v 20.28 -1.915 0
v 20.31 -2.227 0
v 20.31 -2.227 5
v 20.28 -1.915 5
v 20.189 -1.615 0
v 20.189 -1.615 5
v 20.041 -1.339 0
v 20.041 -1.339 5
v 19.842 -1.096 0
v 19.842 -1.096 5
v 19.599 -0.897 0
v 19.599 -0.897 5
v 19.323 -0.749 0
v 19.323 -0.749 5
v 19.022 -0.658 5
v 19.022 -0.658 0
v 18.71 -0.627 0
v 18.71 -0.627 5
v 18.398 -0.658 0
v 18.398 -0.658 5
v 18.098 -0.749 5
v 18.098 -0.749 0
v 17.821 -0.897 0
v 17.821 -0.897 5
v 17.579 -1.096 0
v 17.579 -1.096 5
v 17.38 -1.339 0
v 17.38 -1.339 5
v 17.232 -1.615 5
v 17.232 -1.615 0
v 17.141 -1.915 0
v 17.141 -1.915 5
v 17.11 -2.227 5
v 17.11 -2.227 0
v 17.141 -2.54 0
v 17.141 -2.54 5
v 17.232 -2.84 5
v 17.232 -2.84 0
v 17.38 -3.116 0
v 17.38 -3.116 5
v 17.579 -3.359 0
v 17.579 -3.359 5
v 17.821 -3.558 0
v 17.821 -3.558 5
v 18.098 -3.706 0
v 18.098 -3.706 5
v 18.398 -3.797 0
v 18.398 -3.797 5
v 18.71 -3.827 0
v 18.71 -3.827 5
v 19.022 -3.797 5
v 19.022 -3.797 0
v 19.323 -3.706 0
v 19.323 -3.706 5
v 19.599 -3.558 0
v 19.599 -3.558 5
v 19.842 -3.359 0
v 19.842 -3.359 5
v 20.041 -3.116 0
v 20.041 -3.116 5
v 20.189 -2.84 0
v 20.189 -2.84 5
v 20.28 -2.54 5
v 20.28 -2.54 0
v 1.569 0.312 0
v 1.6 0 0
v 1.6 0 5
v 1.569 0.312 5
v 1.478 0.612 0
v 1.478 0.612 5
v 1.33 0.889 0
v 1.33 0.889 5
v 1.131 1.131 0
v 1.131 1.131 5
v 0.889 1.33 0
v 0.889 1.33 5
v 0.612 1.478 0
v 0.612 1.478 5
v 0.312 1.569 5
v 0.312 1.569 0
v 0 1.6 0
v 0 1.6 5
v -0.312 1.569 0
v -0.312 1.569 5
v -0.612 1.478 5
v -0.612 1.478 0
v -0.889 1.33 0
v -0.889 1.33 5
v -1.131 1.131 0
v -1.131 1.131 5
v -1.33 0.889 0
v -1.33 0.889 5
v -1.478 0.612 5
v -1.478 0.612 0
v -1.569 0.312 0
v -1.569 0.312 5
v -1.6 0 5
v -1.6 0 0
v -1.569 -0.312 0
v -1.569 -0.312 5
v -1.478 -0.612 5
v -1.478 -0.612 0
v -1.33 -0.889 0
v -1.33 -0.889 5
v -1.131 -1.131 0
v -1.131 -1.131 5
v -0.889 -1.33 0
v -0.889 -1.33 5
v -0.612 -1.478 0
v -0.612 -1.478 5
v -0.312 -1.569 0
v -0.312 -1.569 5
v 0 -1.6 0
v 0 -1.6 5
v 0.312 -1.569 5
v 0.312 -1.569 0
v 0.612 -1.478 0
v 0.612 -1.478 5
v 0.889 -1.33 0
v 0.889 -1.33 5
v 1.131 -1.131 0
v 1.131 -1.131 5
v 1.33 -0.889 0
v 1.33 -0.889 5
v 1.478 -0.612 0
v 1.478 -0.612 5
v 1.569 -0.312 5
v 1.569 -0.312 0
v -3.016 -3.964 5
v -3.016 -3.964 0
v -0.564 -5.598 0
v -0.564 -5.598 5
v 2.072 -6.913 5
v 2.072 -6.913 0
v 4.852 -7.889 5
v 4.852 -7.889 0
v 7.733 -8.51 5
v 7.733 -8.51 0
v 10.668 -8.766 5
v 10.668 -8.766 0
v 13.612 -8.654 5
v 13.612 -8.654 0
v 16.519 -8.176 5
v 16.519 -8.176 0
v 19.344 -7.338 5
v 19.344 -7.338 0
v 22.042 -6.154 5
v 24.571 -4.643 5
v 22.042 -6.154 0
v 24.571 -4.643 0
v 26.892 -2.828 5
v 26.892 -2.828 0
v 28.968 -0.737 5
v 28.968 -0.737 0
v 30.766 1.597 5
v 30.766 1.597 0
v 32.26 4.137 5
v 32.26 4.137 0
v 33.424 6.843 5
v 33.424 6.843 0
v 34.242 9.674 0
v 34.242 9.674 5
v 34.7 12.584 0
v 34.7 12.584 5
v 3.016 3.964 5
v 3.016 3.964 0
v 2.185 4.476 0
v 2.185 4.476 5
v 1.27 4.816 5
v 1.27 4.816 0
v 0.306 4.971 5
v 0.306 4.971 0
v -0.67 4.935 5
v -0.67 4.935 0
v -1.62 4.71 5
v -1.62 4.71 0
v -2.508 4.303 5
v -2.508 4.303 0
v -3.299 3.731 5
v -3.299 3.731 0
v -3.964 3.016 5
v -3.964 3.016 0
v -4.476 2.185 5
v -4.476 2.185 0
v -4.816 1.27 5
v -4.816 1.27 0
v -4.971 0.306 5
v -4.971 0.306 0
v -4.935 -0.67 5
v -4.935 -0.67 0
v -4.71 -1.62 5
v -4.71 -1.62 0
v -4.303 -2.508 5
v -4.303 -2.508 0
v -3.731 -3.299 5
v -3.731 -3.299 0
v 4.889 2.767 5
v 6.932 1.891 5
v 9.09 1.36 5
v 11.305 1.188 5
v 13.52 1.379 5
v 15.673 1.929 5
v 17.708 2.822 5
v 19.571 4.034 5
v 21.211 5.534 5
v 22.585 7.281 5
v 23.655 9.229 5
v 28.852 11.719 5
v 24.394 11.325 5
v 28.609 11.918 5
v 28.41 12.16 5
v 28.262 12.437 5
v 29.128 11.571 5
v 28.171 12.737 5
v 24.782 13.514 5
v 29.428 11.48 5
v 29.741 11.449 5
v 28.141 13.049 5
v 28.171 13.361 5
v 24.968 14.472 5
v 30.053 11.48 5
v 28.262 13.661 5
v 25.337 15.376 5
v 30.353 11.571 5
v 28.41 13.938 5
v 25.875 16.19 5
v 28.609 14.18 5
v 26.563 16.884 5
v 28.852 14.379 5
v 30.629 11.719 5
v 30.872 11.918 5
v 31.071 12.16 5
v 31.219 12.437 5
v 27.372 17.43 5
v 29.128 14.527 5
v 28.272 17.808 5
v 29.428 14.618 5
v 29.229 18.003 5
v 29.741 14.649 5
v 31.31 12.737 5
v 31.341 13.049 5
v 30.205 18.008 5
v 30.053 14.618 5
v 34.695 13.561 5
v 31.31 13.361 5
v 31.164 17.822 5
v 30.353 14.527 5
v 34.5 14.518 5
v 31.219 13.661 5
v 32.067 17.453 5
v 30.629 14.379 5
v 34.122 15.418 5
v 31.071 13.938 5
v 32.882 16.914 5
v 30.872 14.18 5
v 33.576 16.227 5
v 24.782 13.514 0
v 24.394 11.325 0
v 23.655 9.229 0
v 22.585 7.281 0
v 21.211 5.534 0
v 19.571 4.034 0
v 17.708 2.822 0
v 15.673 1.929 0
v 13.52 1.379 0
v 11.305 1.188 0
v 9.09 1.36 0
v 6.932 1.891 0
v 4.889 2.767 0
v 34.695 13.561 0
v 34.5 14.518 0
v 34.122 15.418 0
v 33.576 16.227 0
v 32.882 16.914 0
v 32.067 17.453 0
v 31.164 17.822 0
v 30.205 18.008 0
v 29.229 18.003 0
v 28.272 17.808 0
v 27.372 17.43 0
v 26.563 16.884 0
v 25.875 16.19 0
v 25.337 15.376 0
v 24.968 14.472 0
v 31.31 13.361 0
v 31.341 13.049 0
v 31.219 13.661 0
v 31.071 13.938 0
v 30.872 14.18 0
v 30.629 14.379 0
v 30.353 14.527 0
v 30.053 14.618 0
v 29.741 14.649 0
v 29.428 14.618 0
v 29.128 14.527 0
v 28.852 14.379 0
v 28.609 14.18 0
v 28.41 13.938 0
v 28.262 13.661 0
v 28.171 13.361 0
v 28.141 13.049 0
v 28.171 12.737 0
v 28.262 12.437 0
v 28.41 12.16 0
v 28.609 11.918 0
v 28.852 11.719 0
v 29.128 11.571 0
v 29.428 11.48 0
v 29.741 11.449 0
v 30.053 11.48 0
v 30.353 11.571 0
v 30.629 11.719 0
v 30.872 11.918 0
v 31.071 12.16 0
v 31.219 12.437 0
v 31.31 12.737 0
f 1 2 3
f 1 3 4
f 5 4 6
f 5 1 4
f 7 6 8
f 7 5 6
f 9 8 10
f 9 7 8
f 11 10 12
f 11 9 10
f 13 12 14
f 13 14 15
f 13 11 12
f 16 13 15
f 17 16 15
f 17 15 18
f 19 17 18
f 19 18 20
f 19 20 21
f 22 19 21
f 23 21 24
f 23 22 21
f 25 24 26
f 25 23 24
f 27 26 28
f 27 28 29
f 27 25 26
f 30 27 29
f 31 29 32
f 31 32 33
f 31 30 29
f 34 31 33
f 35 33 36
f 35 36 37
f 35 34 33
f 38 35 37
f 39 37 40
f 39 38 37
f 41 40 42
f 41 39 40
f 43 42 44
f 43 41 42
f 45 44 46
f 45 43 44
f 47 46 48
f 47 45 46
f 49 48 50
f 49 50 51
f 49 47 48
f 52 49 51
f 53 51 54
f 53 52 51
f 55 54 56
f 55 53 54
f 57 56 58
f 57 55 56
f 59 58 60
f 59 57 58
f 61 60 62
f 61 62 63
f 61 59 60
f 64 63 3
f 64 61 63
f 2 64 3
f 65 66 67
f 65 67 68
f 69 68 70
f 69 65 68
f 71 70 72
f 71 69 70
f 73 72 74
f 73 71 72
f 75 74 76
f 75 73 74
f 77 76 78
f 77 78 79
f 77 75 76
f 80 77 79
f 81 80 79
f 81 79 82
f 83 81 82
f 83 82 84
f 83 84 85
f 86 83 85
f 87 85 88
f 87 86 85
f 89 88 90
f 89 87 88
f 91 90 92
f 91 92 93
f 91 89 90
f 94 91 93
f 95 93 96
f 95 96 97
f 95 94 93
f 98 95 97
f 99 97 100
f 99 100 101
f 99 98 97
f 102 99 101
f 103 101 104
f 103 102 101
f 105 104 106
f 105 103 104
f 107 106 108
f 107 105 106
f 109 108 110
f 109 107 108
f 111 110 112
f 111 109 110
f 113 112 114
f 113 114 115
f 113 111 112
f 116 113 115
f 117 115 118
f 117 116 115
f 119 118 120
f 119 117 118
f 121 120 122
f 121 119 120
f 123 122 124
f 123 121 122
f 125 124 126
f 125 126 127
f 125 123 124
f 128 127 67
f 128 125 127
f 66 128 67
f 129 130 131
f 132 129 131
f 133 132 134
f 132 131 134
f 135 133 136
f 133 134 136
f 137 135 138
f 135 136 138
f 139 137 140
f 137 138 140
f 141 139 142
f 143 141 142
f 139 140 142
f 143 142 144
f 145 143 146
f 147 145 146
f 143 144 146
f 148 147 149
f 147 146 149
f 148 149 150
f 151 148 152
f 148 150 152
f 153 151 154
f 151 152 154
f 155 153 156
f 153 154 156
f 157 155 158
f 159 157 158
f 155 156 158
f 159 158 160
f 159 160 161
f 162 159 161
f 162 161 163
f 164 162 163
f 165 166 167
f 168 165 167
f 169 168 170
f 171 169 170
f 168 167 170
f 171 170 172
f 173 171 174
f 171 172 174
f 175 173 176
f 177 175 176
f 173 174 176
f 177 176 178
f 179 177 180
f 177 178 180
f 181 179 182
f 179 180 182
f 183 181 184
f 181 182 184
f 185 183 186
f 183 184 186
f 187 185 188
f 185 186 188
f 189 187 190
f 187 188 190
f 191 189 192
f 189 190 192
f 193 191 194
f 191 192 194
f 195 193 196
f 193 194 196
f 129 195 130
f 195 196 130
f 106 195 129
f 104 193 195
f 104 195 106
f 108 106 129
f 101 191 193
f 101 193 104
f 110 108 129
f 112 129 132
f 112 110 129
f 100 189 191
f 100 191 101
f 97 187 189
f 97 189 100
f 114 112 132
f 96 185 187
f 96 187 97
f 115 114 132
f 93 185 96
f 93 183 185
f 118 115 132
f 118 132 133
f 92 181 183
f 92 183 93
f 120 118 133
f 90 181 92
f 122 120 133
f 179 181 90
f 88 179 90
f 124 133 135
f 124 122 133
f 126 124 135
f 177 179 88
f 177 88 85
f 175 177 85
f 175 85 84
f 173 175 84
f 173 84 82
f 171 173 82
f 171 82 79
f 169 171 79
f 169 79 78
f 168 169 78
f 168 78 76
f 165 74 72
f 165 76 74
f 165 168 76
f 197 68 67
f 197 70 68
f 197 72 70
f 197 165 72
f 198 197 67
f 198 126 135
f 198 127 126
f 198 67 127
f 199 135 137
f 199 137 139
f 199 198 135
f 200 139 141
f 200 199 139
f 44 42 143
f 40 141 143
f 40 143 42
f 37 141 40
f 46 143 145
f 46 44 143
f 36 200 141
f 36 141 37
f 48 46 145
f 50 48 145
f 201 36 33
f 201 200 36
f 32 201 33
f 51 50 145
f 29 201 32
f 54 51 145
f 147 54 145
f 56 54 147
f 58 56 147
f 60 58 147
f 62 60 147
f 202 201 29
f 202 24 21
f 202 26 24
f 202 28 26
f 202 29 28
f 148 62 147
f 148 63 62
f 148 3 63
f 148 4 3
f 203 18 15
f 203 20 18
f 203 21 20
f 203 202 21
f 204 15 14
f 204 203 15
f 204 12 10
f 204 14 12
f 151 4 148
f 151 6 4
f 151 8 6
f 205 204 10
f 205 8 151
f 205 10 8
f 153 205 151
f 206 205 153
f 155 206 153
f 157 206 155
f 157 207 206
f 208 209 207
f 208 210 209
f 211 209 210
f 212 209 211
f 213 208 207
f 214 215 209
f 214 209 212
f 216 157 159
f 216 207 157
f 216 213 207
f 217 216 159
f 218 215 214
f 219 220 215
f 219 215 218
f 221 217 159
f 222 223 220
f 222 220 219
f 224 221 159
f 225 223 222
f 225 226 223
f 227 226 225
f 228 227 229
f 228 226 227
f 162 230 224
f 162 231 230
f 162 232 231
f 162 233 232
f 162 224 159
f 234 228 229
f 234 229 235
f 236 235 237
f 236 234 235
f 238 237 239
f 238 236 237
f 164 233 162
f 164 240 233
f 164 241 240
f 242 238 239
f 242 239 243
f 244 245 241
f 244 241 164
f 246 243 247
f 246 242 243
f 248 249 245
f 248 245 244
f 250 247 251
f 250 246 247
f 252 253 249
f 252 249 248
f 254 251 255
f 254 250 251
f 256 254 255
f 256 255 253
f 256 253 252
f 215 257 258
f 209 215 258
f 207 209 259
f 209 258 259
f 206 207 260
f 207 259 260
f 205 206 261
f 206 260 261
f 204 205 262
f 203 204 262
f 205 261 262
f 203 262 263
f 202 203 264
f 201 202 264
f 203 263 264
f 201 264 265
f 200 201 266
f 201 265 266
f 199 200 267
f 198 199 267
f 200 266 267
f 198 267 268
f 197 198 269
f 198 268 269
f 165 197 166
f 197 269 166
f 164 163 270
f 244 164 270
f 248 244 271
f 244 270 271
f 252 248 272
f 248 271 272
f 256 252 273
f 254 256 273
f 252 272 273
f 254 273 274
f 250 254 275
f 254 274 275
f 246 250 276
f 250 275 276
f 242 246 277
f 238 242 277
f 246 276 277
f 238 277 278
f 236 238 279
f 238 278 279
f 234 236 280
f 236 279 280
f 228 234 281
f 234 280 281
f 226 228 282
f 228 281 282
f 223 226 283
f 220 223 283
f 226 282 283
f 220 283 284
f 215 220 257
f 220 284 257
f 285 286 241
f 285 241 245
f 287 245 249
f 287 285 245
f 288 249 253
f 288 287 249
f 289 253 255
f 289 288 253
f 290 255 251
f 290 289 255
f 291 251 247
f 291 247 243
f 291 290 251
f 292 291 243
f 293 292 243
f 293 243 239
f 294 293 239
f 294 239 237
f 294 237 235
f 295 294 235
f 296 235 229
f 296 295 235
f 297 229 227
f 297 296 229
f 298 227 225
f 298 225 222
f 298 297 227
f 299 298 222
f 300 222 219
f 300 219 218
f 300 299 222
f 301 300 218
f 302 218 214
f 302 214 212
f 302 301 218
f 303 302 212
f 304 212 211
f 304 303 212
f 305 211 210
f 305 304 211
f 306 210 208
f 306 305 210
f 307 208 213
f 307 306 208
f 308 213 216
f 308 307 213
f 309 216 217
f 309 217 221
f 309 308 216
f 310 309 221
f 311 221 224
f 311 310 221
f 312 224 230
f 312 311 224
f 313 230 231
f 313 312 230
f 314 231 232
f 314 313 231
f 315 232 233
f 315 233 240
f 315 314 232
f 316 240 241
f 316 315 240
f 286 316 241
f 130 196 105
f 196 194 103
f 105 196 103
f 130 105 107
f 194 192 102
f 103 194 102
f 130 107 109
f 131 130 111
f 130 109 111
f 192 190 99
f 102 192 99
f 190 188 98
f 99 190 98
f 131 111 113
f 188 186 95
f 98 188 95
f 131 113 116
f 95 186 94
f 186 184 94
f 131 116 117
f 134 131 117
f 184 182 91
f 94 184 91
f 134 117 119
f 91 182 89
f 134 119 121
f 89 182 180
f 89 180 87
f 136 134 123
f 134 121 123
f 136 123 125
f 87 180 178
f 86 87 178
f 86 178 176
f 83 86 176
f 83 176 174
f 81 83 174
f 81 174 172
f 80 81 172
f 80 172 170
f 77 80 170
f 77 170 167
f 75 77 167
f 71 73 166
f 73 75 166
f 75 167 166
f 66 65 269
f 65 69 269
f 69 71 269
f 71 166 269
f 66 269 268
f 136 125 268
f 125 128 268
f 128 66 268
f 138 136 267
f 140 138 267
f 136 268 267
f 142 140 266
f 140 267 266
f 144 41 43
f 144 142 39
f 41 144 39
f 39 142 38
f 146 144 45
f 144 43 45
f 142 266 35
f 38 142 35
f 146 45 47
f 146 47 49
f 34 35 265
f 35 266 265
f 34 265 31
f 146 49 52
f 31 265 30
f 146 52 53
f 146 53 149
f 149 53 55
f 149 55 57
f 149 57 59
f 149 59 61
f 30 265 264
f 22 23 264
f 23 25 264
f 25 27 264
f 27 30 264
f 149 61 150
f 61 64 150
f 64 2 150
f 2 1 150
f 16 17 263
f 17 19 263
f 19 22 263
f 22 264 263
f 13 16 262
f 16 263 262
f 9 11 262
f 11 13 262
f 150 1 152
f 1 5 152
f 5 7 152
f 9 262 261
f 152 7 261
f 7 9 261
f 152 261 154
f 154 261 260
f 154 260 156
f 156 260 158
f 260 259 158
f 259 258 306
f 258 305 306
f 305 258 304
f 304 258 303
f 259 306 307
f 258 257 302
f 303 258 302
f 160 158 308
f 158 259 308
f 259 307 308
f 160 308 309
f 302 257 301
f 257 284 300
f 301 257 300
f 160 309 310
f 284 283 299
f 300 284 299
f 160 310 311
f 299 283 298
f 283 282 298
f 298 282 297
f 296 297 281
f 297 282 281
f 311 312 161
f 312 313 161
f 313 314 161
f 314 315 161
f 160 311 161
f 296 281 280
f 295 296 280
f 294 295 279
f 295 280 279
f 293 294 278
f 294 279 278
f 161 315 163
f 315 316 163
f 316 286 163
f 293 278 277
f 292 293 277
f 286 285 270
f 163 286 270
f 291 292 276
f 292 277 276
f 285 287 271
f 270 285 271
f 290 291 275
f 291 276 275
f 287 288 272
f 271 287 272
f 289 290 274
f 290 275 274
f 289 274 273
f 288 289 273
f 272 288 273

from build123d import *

# Parameters (mm, degrees)
SKETCH_1_R      = 1.6
EXTRUDE_1_DEPTH = 5


with BuildPart() as part:
    # 草图1 → 凸台-拉伸1 (new body)
    with BuildSketch(Plane.XY):
        with BuildLine():
            ThreePointArc((-3.016005594, -3.963654581), (20.711469165, -6.788370191), (34.699500163, 12.584473316))
            ThreePointArc((34.699500163, 12.584473316), (30.205119406, 18.007962633), (24.781630088, 13.513581877))
            ThreePointArc((24.781630088, 13.513581877), (16.709135129, 2.333510745), (3.016005594, 3.963654581))
            ThreePointArc((3.016005594, 3.963654581), (-3.963654581, 3.016005594), (-3.016005594, -3.963654581))
        make_face()
        Circle(SKETCH_1_R, mode=Mode.SUBTRACT)
        with Locations((29.740565125, 13.049027596)):
            Circle(SKETCH_1_R, mode=Mode.SUBTRACT)
        with Locations((18.710302147, -2.227429723)):
            Circle(SKETCH_1_R, mode=Mode.SUBTRACT)
    extrude(amount=EXTRUDE_1_DEPTH)


solid = part.part
